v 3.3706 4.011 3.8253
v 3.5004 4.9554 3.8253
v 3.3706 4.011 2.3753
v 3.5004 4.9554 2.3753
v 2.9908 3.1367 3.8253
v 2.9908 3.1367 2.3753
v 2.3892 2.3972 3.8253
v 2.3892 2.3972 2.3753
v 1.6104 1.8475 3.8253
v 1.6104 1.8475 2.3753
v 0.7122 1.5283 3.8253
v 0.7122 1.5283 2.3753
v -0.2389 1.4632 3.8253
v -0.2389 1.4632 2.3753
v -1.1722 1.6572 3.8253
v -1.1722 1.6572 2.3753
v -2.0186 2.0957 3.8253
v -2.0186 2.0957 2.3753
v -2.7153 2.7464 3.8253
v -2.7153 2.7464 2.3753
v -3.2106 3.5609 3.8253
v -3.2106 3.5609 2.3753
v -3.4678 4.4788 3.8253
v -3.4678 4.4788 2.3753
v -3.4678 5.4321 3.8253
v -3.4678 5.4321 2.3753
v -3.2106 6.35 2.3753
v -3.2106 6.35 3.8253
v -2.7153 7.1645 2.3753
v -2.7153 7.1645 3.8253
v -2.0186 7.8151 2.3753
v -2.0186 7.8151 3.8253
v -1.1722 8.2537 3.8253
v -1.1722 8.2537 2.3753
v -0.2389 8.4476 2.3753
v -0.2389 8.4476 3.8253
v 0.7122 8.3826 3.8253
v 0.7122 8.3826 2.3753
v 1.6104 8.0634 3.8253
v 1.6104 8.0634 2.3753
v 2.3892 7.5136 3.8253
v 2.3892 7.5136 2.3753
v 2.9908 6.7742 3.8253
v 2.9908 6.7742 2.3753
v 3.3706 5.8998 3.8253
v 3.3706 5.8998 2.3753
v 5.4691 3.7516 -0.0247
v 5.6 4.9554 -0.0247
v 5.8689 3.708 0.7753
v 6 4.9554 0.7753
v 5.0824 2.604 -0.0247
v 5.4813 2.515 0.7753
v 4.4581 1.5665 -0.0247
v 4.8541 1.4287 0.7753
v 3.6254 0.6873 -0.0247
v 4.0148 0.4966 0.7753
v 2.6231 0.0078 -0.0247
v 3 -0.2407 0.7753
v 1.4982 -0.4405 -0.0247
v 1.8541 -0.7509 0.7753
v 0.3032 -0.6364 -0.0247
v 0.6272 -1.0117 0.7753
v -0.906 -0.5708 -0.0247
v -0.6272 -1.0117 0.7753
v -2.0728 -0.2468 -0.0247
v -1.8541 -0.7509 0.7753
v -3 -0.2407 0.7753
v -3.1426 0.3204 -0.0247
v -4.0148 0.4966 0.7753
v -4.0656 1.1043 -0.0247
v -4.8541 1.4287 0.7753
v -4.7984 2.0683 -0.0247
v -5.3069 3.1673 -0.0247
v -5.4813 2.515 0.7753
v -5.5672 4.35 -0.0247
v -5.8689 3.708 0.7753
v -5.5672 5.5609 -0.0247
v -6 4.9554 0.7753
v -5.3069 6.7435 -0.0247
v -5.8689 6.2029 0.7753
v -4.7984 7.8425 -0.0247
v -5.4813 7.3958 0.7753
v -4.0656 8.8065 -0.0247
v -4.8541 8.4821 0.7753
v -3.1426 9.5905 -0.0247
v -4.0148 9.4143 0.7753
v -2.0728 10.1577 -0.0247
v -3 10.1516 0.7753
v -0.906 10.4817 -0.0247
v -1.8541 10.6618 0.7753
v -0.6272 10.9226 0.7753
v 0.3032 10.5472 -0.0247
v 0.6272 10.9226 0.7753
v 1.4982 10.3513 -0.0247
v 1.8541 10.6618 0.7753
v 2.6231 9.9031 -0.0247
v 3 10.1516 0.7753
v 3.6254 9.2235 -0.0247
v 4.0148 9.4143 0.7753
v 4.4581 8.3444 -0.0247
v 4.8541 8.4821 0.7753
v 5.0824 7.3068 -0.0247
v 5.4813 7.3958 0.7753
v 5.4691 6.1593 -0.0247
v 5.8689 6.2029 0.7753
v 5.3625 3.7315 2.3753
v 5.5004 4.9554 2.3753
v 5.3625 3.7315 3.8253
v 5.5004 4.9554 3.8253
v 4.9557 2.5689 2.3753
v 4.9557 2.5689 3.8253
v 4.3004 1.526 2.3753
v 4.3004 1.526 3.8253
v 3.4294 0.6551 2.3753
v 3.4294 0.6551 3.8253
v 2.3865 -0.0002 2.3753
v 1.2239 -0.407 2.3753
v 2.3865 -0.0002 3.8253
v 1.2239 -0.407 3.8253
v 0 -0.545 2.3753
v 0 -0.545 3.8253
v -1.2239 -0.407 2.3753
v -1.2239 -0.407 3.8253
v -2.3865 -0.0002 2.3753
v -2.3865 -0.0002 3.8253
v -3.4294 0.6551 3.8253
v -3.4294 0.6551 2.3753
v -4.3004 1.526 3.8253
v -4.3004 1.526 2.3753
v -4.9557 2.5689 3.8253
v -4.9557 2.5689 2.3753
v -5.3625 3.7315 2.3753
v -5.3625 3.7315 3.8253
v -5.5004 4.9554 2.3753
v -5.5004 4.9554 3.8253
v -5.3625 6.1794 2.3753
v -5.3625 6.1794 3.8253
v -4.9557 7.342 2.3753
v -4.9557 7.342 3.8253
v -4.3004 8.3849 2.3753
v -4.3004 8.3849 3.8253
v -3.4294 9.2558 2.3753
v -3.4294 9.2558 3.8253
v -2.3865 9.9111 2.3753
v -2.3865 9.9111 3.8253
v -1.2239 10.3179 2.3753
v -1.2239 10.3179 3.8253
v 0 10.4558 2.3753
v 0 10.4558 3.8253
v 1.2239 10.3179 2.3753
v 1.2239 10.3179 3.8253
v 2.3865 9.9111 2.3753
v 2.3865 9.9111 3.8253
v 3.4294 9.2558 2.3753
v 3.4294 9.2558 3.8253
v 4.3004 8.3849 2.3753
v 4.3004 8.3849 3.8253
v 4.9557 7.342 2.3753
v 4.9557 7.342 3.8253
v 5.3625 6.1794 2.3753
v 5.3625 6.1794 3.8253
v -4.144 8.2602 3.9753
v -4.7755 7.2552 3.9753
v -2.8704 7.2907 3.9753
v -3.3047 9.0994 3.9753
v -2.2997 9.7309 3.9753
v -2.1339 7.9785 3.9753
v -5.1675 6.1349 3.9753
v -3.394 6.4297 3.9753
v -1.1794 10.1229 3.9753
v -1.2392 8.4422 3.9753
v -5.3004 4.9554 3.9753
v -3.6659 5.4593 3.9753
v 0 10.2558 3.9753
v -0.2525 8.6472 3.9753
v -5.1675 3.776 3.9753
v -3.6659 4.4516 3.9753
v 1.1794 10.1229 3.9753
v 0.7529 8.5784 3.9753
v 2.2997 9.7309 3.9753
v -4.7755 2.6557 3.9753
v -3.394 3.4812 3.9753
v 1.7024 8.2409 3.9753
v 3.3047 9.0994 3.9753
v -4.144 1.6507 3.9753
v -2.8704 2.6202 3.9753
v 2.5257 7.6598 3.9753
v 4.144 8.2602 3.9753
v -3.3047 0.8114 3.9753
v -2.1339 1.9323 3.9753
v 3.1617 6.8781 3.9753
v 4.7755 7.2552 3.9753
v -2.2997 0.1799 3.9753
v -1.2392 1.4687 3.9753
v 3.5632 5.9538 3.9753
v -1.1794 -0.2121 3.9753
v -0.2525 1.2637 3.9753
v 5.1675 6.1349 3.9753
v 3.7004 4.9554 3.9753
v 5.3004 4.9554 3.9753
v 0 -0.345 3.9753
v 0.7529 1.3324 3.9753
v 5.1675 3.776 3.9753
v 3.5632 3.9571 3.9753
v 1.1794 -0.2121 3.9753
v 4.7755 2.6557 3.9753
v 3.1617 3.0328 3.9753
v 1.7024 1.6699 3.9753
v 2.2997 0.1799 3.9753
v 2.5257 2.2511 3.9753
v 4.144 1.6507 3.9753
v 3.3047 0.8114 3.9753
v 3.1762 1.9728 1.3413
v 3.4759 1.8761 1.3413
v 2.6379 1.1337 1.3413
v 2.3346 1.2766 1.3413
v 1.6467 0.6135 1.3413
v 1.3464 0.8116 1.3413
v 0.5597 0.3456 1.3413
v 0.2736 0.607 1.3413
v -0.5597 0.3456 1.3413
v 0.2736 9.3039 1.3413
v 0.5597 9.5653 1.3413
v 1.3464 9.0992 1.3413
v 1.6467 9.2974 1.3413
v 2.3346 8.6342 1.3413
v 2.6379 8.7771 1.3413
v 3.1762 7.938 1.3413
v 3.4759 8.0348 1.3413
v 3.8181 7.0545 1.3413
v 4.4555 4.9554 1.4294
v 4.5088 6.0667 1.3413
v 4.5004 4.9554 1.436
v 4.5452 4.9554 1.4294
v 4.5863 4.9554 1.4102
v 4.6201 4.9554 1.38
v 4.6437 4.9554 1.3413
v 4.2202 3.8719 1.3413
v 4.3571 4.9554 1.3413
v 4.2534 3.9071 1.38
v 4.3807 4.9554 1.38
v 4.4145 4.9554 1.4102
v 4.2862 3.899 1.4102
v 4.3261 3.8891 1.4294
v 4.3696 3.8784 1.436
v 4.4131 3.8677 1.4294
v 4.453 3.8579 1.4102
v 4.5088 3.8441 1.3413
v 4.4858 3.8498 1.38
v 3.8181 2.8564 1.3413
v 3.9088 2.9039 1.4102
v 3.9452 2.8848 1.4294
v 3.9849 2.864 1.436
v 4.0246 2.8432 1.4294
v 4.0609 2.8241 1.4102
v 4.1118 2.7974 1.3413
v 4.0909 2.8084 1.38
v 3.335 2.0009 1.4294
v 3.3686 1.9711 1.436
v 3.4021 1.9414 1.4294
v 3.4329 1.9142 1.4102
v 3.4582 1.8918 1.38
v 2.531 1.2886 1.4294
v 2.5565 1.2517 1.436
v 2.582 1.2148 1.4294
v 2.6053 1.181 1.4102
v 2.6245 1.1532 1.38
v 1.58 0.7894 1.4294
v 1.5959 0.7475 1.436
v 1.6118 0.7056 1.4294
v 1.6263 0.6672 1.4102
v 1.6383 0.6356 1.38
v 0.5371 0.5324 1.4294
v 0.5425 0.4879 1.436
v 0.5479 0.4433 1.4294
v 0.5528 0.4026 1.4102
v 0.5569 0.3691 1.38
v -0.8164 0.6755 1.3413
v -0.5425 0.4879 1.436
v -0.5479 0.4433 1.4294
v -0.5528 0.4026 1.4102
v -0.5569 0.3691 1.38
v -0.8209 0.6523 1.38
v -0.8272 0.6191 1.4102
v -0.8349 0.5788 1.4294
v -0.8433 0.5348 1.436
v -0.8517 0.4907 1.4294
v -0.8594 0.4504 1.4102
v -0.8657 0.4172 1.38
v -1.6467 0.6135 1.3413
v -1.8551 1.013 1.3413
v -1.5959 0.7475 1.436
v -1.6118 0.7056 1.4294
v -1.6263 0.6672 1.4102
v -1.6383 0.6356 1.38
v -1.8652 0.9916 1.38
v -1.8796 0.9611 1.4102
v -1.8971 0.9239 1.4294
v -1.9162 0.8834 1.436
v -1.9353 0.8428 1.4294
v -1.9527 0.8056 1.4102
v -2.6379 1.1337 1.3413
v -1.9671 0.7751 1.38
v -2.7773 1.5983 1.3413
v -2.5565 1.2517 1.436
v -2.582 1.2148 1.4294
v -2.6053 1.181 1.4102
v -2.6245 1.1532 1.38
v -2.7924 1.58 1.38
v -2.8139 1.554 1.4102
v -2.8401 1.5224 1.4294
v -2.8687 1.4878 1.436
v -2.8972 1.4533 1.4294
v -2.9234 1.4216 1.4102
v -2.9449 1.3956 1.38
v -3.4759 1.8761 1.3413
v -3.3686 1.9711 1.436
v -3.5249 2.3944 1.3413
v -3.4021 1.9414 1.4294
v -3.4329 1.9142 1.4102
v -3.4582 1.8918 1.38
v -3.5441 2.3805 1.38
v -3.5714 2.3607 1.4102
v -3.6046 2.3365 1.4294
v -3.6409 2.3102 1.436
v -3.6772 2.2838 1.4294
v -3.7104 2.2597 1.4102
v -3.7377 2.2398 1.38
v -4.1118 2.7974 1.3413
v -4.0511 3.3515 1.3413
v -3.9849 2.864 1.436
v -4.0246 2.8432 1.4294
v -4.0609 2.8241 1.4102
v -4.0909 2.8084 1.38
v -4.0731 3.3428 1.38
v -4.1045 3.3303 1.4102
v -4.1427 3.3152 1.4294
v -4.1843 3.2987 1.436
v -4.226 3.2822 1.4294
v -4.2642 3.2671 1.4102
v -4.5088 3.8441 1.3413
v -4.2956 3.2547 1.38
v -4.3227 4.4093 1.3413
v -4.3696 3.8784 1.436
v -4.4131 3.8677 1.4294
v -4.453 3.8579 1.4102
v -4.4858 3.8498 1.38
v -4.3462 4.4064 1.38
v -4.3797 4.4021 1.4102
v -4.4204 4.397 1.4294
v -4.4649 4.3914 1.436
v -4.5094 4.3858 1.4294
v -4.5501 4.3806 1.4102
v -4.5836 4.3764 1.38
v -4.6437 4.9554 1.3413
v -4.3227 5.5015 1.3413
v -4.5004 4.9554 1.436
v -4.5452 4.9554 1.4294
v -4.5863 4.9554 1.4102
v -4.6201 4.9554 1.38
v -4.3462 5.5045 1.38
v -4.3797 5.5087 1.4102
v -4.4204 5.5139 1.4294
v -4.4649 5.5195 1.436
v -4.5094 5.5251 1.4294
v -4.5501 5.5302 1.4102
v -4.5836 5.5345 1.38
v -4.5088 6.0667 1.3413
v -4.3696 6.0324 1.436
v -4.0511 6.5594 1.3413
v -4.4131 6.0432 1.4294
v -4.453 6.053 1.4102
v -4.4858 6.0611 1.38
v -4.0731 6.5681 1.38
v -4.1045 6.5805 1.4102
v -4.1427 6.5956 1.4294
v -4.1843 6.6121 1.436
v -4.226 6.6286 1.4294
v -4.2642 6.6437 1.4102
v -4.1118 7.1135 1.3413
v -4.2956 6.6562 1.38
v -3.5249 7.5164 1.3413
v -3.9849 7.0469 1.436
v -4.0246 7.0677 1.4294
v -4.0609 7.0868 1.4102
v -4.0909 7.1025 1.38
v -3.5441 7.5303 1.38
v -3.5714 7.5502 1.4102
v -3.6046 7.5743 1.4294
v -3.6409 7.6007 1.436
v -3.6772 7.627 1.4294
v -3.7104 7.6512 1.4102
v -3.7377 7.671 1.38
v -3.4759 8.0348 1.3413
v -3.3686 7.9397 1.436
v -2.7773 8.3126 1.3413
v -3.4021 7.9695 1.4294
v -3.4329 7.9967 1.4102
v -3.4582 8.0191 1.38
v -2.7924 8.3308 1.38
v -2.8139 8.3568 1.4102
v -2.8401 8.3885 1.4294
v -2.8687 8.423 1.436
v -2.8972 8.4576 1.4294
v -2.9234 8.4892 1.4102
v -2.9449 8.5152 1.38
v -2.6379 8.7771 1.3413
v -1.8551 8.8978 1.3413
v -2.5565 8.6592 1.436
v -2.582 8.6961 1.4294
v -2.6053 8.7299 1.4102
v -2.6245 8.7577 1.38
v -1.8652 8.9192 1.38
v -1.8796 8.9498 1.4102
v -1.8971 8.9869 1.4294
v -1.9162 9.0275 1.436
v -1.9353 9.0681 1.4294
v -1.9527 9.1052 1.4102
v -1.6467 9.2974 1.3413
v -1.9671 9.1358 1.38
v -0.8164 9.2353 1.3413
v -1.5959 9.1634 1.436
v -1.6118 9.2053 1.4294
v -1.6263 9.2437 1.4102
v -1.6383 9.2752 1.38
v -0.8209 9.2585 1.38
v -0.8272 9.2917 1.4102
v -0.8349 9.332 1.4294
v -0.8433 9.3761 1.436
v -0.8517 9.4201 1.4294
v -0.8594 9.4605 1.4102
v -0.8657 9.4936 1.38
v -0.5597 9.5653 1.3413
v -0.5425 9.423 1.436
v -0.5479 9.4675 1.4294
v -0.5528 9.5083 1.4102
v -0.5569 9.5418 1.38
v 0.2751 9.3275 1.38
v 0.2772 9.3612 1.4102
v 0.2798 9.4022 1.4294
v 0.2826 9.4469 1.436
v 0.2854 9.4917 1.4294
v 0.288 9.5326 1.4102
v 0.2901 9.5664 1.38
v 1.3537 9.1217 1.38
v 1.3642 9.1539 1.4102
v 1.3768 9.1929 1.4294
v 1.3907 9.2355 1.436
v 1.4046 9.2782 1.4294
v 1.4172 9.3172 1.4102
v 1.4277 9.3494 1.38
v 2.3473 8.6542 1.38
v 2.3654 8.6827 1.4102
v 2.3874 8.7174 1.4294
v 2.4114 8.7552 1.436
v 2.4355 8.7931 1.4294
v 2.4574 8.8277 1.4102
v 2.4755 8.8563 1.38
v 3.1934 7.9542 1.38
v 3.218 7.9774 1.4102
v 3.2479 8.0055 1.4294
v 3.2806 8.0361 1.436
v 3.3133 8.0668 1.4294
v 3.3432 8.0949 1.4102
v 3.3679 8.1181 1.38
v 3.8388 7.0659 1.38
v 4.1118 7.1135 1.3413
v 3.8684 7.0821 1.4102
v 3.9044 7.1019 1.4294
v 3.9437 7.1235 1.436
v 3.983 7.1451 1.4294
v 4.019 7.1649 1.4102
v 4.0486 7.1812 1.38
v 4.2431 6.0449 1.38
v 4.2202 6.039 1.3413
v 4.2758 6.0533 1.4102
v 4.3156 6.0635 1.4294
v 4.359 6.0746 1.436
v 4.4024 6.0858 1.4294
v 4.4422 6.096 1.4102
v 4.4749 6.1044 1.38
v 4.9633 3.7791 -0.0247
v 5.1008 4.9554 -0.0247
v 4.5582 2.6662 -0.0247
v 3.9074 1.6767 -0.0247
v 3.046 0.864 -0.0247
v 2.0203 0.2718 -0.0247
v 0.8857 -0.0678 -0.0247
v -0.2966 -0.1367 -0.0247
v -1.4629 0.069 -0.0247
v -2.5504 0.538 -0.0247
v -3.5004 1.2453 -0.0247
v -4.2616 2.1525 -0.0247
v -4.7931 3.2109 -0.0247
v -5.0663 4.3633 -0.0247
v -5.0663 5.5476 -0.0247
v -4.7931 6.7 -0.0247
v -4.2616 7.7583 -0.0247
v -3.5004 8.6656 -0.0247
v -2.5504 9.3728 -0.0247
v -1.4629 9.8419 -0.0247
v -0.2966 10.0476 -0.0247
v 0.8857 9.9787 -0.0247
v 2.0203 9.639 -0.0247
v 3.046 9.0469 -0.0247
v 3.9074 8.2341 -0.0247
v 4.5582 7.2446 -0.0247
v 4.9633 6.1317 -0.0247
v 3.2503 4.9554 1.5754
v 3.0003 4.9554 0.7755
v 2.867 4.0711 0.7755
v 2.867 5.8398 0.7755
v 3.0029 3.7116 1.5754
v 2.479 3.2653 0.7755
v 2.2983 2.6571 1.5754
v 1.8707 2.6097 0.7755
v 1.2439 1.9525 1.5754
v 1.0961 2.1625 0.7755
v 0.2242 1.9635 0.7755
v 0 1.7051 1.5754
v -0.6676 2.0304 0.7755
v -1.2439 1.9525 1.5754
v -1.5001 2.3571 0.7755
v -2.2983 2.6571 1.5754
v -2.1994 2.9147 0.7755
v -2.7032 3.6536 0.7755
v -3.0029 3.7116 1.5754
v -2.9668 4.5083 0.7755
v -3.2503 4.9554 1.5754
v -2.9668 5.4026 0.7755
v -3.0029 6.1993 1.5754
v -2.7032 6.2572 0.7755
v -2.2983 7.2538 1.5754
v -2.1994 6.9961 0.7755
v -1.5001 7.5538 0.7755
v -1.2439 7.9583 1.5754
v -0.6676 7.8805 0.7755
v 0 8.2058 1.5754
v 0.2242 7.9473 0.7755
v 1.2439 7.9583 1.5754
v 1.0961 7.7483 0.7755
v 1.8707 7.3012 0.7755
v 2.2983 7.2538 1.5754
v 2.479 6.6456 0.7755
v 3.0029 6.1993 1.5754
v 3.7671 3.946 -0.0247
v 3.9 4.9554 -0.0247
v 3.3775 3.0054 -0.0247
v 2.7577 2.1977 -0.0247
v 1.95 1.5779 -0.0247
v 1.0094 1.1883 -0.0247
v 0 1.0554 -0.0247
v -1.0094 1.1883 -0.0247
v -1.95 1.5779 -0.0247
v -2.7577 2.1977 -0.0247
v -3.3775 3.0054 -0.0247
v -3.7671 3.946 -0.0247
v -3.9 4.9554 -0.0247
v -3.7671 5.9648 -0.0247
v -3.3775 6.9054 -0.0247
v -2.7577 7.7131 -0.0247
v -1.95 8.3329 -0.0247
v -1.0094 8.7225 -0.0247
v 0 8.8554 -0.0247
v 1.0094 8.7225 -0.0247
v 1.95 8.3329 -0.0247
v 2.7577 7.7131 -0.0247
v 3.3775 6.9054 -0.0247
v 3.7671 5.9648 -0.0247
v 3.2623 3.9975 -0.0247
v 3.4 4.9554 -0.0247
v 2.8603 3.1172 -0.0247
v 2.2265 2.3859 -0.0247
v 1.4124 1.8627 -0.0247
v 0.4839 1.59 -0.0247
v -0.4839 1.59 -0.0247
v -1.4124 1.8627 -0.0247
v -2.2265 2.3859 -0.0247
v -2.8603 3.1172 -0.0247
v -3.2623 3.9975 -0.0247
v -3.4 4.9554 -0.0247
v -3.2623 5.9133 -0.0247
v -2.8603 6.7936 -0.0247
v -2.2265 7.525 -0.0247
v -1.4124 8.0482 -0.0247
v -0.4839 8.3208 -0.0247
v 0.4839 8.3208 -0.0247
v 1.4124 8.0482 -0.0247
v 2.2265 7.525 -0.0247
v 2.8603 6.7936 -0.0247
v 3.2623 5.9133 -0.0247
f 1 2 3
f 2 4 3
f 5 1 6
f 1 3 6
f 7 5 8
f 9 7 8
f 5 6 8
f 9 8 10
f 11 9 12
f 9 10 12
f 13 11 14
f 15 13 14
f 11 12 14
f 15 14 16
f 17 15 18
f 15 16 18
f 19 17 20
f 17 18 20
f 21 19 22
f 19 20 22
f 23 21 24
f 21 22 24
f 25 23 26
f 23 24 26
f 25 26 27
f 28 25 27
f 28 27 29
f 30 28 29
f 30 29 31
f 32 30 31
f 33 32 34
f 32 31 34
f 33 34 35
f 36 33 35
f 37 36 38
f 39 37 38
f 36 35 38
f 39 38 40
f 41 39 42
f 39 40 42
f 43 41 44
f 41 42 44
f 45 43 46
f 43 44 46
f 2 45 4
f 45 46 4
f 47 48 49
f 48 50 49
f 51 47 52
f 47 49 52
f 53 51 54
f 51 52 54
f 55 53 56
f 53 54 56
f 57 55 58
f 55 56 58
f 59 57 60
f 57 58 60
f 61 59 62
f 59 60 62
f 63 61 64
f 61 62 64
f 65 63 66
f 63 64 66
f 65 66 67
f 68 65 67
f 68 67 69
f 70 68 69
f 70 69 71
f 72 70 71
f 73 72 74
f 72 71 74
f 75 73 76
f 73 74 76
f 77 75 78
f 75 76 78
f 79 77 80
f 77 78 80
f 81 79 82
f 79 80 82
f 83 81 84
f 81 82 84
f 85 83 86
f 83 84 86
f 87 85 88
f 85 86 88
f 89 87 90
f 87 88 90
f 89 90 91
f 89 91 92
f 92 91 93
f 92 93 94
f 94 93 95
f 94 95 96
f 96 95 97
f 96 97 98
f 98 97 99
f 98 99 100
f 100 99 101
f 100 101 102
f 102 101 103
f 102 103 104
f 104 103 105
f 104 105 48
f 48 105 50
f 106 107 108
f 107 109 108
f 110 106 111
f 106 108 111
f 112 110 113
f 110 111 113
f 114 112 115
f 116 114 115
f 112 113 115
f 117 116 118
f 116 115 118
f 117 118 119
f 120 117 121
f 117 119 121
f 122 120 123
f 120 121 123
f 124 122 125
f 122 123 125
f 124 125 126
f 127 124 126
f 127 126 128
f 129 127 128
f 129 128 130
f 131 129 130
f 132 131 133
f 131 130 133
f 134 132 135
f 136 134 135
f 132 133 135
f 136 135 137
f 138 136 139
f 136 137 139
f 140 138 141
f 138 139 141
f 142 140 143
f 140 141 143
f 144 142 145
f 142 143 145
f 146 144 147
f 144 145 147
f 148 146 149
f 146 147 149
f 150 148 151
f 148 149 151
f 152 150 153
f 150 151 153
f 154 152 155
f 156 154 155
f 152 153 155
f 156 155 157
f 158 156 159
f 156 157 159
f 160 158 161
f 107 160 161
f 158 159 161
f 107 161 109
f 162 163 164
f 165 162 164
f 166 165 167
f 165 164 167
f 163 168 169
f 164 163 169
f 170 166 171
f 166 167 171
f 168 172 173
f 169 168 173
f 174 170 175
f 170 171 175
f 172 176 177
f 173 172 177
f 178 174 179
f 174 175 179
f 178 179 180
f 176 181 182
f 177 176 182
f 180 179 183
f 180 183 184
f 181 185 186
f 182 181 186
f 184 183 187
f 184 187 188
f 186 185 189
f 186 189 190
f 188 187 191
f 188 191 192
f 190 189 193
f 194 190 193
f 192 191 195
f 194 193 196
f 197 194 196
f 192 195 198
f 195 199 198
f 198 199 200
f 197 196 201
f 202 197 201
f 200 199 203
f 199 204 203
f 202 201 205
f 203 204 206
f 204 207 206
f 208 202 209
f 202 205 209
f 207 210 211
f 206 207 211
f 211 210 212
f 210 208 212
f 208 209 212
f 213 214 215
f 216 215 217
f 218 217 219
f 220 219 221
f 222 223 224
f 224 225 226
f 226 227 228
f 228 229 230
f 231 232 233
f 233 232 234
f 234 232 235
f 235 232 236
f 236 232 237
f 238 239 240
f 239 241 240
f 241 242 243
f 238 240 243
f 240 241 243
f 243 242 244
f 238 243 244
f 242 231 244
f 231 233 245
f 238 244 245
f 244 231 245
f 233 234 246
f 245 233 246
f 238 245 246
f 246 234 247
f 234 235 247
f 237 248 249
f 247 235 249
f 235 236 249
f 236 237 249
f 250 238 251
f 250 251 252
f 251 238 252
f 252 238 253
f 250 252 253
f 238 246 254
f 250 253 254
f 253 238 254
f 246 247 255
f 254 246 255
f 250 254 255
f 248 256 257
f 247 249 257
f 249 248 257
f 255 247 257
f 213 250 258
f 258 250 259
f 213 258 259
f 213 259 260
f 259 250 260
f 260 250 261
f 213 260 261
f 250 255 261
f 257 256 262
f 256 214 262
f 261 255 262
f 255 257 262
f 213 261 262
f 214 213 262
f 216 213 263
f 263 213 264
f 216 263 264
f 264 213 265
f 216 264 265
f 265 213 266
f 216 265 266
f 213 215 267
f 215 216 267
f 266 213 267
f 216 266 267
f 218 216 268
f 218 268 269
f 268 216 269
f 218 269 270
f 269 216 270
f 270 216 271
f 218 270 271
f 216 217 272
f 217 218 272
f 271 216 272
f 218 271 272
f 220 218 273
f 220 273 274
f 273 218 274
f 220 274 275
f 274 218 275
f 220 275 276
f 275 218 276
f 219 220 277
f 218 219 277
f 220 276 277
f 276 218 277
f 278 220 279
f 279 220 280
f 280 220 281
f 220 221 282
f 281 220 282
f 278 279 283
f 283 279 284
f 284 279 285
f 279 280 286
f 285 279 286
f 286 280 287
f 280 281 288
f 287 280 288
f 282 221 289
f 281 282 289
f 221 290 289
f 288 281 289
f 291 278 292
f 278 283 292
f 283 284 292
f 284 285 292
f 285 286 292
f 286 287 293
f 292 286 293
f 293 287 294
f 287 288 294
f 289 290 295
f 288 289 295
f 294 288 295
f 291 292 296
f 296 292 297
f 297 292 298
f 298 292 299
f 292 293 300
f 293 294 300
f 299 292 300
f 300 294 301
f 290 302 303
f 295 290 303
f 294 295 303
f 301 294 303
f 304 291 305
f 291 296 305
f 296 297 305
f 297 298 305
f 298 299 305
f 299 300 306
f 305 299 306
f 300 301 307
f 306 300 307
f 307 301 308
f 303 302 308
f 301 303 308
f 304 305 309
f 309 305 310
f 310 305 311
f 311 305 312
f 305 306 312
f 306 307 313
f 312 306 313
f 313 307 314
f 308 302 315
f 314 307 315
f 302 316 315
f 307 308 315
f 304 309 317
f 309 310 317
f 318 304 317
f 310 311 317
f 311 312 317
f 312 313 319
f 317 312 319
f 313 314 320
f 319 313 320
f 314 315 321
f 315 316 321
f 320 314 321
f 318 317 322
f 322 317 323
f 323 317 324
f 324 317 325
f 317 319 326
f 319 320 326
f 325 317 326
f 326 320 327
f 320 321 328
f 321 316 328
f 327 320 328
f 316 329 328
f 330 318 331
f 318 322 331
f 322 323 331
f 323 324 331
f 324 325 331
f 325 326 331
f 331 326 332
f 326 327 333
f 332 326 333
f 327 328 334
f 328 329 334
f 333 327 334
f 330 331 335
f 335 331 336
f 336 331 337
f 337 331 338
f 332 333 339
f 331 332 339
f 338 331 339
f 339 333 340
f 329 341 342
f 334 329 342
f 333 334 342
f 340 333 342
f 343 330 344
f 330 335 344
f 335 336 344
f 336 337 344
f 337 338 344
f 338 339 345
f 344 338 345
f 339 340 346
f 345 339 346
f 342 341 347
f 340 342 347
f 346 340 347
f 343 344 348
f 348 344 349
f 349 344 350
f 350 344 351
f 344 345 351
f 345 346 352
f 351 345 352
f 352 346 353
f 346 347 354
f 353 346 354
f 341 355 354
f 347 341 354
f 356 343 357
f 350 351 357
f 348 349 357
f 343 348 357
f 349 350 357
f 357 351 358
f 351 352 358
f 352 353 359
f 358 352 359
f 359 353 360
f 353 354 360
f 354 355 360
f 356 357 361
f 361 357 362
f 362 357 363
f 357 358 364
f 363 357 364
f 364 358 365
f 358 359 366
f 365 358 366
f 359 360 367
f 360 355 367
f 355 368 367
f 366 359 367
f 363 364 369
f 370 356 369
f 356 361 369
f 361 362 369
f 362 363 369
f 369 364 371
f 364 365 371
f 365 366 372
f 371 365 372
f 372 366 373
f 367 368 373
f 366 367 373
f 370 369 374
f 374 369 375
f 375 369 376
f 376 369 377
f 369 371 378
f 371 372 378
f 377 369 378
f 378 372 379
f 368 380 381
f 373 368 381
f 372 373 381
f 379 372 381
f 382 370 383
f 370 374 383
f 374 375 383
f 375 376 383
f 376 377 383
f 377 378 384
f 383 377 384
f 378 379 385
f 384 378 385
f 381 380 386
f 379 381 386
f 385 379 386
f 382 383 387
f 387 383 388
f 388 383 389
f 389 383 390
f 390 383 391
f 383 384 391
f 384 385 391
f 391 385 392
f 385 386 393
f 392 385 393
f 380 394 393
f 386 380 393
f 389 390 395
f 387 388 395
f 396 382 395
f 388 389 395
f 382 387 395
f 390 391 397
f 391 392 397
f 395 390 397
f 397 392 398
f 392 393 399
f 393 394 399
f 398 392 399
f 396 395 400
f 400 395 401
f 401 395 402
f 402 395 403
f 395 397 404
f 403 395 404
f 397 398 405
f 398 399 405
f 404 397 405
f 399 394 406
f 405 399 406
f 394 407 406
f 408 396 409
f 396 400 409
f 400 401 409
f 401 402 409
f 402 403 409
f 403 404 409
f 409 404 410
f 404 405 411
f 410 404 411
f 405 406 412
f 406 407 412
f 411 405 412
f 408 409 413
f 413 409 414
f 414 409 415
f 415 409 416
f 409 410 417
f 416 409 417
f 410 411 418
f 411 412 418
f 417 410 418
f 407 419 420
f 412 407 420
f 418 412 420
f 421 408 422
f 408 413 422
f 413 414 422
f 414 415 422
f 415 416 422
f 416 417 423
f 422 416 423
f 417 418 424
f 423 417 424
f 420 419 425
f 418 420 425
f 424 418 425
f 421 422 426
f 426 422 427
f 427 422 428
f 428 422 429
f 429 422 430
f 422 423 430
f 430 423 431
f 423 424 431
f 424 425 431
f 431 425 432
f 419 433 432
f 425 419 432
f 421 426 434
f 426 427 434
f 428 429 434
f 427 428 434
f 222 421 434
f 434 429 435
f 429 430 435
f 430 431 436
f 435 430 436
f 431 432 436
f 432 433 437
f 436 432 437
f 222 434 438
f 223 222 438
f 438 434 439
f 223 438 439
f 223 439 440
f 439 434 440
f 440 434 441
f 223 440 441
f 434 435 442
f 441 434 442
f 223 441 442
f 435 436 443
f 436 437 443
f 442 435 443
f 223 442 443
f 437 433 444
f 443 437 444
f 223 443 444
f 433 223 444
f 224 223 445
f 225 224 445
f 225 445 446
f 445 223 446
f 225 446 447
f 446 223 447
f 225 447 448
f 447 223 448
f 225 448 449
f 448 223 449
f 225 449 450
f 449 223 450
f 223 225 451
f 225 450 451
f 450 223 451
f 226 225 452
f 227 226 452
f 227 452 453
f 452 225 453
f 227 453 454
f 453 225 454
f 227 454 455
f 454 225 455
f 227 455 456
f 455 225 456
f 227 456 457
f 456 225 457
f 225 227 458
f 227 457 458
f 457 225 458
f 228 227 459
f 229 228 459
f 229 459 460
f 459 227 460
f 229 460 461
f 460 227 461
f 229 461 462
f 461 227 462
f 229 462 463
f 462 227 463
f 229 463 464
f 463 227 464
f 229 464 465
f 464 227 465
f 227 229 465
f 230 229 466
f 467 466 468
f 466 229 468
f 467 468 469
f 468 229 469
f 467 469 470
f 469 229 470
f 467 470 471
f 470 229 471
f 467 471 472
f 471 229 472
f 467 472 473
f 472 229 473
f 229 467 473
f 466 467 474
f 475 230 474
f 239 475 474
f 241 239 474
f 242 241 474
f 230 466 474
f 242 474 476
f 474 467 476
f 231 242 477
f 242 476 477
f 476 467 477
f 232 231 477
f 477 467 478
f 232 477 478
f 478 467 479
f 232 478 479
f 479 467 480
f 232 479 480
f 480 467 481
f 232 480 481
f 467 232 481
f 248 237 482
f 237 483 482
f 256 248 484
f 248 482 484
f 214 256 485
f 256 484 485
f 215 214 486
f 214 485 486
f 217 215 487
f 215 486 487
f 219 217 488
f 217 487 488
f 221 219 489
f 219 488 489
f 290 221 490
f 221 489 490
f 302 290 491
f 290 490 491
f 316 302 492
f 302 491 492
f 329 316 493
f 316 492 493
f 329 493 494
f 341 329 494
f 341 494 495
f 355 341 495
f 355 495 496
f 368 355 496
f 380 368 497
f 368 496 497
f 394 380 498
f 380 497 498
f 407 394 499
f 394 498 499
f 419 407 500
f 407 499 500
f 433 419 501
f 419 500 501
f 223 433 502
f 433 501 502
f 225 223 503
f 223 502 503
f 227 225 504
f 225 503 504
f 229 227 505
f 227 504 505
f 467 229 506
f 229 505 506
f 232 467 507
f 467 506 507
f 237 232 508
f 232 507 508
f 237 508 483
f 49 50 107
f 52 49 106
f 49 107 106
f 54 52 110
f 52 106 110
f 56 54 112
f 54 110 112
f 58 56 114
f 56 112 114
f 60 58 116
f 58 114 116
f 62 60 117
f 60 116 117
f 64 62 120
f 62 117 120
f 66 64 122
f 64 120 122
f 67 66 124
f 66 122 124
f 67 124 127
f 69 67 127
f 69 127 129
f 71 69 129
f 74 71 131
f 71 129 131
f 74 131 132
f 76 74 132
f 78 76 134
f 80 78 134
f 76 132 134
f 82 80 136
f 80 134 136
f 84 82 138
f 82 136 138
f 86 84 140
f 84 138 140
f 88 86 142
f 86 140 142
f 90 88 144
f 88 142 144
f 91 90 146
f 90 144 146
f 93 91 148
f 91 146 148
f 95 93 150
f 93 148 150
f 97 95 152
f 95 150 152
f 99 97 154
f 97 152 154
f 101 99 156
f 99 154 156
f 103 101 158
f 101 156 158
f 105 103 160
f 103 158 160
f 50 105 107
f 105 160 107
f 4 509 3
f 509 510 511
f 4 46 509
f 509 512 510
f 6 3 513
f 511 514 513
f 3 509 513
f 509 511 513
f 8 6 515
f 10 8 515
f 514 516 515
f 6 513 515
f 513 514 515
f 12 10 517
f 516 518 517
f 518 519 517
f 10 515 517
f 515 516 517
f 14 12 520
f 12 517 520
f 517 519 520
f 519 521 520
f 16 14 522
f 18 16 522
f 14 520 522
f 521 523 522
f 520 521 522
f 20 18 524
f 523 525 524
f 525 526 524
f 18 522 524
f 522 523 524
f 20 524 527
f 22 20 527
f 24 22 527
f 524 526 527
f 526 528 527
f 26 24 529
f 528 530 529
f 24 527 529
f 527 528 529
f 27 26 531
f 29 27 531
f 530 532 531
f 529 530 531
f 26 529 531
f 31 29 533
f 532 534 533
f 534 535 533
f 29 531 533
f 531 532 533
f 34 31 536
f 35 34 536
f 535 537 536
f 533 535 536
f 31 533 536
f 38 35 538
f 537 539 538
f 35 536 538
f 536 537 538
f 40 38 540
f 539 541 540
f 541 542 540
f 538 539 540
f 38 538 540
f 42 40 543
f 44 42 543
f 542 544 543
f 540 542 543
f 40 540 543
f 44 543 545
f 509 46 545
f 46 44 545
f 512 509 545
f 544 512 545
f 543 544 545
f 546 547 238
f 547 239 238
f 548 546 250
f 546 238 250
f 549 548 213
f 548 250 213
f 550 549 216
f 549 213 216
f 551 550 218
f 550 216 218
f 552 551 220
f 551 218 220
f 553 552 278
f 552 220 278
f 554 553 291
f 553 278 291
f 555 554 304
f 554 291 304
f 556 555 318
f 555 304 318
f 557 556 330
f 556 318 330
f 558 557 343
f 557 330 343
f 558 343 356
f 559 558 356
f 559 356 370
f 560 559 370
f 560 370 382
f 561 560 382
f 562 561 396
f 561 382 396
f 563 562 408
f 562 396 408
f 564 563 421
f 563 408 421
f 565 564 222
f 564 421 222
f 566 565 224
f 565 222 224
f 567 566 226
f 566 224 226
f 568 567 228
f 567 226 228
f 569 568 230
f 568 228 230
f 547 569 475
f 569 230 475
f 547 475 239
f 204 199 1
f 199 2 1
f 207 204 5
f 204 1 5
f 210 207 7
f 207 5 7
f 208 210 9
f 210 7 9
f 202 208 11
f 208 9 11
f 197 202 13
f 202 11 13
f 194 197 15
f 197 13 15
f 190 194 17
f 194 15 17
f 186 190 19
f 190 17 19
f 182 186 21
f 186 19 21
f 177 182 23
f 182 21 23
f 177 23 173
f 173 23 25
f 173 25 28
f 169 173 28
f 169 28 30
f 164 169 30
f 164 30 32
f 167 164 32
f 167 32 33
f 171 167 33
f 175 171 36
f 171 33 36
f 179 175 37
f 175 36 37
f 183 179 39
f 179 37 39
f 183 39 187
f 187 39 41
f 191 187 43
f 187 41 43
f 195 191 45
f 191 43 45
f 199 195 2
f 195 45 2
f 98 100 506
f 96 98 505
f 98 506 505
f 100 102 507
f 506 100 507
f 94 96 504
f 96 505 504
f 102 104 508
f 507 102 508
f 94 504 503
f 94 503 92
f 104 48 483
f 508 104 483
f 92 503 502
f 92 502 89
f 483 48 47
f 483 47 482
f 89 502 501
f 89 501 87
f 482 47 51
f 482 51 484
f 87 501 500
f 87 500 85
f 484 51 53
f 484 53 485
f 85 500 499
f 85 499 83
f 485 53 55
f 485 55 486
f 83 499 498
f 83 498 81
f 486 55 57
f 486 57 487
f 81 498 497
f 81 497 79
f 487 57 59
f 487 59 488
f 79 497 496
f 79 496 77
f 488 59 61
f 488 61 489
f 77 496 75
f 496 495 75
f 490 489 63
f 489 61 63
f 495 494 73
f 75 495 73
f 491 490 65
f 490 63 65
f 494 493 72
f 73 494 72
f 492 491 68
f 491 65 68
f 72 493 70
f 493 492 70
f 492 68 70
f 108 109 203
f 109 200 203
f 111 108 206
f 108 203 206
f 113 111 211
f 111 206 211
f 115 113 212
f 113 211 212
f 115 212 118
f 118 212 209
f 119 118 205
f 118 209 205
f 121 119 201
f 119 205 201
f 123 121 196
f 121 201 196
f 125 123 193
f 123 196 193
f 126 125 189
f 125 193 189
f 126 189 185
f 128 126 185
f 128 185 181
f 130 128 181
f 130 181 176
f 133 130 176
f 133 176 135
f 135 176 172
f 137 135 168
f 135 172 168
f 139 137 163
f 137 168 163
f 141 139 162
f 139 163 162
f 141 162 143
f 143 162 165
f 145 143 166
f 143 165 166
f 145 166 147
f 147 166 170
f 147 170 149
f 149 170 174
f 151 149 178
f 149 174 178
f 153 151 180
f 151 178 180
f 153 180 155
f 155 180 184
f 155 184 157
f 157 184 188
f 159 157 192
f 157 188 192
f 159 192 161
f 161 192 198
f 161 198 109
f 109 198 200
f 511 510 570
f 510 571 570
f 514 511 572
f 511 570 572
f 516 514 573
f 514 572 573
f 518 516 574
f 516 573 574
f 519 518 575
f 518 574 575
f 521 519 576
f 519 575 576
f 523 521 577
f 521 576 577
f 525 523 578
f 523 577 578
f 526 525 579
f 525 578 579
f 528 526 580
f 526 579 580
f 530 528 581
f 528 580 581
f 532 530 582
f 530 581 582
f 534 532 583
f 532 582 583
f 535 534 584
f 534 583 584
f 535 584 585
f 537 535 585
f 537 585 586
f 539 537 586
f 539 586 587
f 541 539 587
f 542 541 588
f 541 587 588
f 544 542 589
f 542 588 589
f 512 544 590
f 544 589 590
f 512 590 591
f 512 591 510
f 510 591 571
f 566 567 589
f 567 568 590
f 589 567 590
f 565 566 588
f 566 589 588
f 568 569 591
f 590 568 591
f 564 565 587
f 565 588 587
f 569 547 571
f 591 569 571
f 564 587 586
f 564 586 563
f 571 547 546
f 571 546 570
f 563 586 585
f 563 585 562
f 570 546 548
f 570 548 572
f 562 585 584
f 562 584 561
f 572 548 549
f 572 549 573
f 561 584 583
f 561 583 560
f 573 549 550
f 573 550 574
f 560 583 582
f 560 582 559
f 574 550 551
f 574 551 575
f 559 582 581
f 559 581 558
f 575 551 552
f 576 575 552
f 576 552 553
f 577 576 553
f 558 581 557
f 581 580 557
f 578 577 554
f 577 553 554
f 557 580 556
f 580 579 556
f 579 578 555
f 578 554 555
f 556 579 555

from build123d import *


with BuildPart() as part:
    # Sketch2 → Revolve1 (revolve)
    with BuildSketch(Plane(origin=(0, 0, 0), x_dir=(0, 0, -1), z_dir=(1, 0, 0)), mode=Mode.PRIVATE) as revolve1_sk:
        with BuildLine():
            Line((0.024688303, 1.555426785), (0.024688303, 1.055426785))
            Line((0.024688303, 1.055426785), (-1.341325441, 0.598364979))
            ThreePointArc((-1.341325441, 0.598364979), (-1.436030164, 0.45504575), (-1.341325441, 0.31172652))
            Line((-1.341325441, 0.31172652), (0.024688303, -0.145335285))
            Line((0.024688303, -0.145335285), (0.024688303, -0.644573215))
            Line((0.024688303, -0.644573215), (-0.775311697, -1.044573215))
            Line((-0.775311697, -1.044573215), (-2.375311697, -0.54495425))
            Line((-2.375311697, -0.54495425), (-3.825311697, -0.54495425))
            Line((-3.825311697, -0.54495425), (-3.975311697, -0.34495425))
            Line((-3.975311697, -0.34495425), (-3.975311697, 1.25504575))
            Line((-3.975311697, 1.25504575), (-3.825311697, 1.45504575))
            Line((-3.825311697, 1.45504575), (-2.375311697, 1.45504575))
            Line((-2.375311697, 1.45504575), (-0.7754582, 1.955133643))
            Line((-0.7754582, 1.955133643), (0.024688303, 1.555426785))
        make_face()
    revolve(revolve1_sk.sketch.rotate(Axis((0, 4.955426785, 17.313384256), (0, 0, -1)), 270), axis=Axis((0, 4.955426785, 17.313384256), (0, 0, -1)))


solid = part.part
